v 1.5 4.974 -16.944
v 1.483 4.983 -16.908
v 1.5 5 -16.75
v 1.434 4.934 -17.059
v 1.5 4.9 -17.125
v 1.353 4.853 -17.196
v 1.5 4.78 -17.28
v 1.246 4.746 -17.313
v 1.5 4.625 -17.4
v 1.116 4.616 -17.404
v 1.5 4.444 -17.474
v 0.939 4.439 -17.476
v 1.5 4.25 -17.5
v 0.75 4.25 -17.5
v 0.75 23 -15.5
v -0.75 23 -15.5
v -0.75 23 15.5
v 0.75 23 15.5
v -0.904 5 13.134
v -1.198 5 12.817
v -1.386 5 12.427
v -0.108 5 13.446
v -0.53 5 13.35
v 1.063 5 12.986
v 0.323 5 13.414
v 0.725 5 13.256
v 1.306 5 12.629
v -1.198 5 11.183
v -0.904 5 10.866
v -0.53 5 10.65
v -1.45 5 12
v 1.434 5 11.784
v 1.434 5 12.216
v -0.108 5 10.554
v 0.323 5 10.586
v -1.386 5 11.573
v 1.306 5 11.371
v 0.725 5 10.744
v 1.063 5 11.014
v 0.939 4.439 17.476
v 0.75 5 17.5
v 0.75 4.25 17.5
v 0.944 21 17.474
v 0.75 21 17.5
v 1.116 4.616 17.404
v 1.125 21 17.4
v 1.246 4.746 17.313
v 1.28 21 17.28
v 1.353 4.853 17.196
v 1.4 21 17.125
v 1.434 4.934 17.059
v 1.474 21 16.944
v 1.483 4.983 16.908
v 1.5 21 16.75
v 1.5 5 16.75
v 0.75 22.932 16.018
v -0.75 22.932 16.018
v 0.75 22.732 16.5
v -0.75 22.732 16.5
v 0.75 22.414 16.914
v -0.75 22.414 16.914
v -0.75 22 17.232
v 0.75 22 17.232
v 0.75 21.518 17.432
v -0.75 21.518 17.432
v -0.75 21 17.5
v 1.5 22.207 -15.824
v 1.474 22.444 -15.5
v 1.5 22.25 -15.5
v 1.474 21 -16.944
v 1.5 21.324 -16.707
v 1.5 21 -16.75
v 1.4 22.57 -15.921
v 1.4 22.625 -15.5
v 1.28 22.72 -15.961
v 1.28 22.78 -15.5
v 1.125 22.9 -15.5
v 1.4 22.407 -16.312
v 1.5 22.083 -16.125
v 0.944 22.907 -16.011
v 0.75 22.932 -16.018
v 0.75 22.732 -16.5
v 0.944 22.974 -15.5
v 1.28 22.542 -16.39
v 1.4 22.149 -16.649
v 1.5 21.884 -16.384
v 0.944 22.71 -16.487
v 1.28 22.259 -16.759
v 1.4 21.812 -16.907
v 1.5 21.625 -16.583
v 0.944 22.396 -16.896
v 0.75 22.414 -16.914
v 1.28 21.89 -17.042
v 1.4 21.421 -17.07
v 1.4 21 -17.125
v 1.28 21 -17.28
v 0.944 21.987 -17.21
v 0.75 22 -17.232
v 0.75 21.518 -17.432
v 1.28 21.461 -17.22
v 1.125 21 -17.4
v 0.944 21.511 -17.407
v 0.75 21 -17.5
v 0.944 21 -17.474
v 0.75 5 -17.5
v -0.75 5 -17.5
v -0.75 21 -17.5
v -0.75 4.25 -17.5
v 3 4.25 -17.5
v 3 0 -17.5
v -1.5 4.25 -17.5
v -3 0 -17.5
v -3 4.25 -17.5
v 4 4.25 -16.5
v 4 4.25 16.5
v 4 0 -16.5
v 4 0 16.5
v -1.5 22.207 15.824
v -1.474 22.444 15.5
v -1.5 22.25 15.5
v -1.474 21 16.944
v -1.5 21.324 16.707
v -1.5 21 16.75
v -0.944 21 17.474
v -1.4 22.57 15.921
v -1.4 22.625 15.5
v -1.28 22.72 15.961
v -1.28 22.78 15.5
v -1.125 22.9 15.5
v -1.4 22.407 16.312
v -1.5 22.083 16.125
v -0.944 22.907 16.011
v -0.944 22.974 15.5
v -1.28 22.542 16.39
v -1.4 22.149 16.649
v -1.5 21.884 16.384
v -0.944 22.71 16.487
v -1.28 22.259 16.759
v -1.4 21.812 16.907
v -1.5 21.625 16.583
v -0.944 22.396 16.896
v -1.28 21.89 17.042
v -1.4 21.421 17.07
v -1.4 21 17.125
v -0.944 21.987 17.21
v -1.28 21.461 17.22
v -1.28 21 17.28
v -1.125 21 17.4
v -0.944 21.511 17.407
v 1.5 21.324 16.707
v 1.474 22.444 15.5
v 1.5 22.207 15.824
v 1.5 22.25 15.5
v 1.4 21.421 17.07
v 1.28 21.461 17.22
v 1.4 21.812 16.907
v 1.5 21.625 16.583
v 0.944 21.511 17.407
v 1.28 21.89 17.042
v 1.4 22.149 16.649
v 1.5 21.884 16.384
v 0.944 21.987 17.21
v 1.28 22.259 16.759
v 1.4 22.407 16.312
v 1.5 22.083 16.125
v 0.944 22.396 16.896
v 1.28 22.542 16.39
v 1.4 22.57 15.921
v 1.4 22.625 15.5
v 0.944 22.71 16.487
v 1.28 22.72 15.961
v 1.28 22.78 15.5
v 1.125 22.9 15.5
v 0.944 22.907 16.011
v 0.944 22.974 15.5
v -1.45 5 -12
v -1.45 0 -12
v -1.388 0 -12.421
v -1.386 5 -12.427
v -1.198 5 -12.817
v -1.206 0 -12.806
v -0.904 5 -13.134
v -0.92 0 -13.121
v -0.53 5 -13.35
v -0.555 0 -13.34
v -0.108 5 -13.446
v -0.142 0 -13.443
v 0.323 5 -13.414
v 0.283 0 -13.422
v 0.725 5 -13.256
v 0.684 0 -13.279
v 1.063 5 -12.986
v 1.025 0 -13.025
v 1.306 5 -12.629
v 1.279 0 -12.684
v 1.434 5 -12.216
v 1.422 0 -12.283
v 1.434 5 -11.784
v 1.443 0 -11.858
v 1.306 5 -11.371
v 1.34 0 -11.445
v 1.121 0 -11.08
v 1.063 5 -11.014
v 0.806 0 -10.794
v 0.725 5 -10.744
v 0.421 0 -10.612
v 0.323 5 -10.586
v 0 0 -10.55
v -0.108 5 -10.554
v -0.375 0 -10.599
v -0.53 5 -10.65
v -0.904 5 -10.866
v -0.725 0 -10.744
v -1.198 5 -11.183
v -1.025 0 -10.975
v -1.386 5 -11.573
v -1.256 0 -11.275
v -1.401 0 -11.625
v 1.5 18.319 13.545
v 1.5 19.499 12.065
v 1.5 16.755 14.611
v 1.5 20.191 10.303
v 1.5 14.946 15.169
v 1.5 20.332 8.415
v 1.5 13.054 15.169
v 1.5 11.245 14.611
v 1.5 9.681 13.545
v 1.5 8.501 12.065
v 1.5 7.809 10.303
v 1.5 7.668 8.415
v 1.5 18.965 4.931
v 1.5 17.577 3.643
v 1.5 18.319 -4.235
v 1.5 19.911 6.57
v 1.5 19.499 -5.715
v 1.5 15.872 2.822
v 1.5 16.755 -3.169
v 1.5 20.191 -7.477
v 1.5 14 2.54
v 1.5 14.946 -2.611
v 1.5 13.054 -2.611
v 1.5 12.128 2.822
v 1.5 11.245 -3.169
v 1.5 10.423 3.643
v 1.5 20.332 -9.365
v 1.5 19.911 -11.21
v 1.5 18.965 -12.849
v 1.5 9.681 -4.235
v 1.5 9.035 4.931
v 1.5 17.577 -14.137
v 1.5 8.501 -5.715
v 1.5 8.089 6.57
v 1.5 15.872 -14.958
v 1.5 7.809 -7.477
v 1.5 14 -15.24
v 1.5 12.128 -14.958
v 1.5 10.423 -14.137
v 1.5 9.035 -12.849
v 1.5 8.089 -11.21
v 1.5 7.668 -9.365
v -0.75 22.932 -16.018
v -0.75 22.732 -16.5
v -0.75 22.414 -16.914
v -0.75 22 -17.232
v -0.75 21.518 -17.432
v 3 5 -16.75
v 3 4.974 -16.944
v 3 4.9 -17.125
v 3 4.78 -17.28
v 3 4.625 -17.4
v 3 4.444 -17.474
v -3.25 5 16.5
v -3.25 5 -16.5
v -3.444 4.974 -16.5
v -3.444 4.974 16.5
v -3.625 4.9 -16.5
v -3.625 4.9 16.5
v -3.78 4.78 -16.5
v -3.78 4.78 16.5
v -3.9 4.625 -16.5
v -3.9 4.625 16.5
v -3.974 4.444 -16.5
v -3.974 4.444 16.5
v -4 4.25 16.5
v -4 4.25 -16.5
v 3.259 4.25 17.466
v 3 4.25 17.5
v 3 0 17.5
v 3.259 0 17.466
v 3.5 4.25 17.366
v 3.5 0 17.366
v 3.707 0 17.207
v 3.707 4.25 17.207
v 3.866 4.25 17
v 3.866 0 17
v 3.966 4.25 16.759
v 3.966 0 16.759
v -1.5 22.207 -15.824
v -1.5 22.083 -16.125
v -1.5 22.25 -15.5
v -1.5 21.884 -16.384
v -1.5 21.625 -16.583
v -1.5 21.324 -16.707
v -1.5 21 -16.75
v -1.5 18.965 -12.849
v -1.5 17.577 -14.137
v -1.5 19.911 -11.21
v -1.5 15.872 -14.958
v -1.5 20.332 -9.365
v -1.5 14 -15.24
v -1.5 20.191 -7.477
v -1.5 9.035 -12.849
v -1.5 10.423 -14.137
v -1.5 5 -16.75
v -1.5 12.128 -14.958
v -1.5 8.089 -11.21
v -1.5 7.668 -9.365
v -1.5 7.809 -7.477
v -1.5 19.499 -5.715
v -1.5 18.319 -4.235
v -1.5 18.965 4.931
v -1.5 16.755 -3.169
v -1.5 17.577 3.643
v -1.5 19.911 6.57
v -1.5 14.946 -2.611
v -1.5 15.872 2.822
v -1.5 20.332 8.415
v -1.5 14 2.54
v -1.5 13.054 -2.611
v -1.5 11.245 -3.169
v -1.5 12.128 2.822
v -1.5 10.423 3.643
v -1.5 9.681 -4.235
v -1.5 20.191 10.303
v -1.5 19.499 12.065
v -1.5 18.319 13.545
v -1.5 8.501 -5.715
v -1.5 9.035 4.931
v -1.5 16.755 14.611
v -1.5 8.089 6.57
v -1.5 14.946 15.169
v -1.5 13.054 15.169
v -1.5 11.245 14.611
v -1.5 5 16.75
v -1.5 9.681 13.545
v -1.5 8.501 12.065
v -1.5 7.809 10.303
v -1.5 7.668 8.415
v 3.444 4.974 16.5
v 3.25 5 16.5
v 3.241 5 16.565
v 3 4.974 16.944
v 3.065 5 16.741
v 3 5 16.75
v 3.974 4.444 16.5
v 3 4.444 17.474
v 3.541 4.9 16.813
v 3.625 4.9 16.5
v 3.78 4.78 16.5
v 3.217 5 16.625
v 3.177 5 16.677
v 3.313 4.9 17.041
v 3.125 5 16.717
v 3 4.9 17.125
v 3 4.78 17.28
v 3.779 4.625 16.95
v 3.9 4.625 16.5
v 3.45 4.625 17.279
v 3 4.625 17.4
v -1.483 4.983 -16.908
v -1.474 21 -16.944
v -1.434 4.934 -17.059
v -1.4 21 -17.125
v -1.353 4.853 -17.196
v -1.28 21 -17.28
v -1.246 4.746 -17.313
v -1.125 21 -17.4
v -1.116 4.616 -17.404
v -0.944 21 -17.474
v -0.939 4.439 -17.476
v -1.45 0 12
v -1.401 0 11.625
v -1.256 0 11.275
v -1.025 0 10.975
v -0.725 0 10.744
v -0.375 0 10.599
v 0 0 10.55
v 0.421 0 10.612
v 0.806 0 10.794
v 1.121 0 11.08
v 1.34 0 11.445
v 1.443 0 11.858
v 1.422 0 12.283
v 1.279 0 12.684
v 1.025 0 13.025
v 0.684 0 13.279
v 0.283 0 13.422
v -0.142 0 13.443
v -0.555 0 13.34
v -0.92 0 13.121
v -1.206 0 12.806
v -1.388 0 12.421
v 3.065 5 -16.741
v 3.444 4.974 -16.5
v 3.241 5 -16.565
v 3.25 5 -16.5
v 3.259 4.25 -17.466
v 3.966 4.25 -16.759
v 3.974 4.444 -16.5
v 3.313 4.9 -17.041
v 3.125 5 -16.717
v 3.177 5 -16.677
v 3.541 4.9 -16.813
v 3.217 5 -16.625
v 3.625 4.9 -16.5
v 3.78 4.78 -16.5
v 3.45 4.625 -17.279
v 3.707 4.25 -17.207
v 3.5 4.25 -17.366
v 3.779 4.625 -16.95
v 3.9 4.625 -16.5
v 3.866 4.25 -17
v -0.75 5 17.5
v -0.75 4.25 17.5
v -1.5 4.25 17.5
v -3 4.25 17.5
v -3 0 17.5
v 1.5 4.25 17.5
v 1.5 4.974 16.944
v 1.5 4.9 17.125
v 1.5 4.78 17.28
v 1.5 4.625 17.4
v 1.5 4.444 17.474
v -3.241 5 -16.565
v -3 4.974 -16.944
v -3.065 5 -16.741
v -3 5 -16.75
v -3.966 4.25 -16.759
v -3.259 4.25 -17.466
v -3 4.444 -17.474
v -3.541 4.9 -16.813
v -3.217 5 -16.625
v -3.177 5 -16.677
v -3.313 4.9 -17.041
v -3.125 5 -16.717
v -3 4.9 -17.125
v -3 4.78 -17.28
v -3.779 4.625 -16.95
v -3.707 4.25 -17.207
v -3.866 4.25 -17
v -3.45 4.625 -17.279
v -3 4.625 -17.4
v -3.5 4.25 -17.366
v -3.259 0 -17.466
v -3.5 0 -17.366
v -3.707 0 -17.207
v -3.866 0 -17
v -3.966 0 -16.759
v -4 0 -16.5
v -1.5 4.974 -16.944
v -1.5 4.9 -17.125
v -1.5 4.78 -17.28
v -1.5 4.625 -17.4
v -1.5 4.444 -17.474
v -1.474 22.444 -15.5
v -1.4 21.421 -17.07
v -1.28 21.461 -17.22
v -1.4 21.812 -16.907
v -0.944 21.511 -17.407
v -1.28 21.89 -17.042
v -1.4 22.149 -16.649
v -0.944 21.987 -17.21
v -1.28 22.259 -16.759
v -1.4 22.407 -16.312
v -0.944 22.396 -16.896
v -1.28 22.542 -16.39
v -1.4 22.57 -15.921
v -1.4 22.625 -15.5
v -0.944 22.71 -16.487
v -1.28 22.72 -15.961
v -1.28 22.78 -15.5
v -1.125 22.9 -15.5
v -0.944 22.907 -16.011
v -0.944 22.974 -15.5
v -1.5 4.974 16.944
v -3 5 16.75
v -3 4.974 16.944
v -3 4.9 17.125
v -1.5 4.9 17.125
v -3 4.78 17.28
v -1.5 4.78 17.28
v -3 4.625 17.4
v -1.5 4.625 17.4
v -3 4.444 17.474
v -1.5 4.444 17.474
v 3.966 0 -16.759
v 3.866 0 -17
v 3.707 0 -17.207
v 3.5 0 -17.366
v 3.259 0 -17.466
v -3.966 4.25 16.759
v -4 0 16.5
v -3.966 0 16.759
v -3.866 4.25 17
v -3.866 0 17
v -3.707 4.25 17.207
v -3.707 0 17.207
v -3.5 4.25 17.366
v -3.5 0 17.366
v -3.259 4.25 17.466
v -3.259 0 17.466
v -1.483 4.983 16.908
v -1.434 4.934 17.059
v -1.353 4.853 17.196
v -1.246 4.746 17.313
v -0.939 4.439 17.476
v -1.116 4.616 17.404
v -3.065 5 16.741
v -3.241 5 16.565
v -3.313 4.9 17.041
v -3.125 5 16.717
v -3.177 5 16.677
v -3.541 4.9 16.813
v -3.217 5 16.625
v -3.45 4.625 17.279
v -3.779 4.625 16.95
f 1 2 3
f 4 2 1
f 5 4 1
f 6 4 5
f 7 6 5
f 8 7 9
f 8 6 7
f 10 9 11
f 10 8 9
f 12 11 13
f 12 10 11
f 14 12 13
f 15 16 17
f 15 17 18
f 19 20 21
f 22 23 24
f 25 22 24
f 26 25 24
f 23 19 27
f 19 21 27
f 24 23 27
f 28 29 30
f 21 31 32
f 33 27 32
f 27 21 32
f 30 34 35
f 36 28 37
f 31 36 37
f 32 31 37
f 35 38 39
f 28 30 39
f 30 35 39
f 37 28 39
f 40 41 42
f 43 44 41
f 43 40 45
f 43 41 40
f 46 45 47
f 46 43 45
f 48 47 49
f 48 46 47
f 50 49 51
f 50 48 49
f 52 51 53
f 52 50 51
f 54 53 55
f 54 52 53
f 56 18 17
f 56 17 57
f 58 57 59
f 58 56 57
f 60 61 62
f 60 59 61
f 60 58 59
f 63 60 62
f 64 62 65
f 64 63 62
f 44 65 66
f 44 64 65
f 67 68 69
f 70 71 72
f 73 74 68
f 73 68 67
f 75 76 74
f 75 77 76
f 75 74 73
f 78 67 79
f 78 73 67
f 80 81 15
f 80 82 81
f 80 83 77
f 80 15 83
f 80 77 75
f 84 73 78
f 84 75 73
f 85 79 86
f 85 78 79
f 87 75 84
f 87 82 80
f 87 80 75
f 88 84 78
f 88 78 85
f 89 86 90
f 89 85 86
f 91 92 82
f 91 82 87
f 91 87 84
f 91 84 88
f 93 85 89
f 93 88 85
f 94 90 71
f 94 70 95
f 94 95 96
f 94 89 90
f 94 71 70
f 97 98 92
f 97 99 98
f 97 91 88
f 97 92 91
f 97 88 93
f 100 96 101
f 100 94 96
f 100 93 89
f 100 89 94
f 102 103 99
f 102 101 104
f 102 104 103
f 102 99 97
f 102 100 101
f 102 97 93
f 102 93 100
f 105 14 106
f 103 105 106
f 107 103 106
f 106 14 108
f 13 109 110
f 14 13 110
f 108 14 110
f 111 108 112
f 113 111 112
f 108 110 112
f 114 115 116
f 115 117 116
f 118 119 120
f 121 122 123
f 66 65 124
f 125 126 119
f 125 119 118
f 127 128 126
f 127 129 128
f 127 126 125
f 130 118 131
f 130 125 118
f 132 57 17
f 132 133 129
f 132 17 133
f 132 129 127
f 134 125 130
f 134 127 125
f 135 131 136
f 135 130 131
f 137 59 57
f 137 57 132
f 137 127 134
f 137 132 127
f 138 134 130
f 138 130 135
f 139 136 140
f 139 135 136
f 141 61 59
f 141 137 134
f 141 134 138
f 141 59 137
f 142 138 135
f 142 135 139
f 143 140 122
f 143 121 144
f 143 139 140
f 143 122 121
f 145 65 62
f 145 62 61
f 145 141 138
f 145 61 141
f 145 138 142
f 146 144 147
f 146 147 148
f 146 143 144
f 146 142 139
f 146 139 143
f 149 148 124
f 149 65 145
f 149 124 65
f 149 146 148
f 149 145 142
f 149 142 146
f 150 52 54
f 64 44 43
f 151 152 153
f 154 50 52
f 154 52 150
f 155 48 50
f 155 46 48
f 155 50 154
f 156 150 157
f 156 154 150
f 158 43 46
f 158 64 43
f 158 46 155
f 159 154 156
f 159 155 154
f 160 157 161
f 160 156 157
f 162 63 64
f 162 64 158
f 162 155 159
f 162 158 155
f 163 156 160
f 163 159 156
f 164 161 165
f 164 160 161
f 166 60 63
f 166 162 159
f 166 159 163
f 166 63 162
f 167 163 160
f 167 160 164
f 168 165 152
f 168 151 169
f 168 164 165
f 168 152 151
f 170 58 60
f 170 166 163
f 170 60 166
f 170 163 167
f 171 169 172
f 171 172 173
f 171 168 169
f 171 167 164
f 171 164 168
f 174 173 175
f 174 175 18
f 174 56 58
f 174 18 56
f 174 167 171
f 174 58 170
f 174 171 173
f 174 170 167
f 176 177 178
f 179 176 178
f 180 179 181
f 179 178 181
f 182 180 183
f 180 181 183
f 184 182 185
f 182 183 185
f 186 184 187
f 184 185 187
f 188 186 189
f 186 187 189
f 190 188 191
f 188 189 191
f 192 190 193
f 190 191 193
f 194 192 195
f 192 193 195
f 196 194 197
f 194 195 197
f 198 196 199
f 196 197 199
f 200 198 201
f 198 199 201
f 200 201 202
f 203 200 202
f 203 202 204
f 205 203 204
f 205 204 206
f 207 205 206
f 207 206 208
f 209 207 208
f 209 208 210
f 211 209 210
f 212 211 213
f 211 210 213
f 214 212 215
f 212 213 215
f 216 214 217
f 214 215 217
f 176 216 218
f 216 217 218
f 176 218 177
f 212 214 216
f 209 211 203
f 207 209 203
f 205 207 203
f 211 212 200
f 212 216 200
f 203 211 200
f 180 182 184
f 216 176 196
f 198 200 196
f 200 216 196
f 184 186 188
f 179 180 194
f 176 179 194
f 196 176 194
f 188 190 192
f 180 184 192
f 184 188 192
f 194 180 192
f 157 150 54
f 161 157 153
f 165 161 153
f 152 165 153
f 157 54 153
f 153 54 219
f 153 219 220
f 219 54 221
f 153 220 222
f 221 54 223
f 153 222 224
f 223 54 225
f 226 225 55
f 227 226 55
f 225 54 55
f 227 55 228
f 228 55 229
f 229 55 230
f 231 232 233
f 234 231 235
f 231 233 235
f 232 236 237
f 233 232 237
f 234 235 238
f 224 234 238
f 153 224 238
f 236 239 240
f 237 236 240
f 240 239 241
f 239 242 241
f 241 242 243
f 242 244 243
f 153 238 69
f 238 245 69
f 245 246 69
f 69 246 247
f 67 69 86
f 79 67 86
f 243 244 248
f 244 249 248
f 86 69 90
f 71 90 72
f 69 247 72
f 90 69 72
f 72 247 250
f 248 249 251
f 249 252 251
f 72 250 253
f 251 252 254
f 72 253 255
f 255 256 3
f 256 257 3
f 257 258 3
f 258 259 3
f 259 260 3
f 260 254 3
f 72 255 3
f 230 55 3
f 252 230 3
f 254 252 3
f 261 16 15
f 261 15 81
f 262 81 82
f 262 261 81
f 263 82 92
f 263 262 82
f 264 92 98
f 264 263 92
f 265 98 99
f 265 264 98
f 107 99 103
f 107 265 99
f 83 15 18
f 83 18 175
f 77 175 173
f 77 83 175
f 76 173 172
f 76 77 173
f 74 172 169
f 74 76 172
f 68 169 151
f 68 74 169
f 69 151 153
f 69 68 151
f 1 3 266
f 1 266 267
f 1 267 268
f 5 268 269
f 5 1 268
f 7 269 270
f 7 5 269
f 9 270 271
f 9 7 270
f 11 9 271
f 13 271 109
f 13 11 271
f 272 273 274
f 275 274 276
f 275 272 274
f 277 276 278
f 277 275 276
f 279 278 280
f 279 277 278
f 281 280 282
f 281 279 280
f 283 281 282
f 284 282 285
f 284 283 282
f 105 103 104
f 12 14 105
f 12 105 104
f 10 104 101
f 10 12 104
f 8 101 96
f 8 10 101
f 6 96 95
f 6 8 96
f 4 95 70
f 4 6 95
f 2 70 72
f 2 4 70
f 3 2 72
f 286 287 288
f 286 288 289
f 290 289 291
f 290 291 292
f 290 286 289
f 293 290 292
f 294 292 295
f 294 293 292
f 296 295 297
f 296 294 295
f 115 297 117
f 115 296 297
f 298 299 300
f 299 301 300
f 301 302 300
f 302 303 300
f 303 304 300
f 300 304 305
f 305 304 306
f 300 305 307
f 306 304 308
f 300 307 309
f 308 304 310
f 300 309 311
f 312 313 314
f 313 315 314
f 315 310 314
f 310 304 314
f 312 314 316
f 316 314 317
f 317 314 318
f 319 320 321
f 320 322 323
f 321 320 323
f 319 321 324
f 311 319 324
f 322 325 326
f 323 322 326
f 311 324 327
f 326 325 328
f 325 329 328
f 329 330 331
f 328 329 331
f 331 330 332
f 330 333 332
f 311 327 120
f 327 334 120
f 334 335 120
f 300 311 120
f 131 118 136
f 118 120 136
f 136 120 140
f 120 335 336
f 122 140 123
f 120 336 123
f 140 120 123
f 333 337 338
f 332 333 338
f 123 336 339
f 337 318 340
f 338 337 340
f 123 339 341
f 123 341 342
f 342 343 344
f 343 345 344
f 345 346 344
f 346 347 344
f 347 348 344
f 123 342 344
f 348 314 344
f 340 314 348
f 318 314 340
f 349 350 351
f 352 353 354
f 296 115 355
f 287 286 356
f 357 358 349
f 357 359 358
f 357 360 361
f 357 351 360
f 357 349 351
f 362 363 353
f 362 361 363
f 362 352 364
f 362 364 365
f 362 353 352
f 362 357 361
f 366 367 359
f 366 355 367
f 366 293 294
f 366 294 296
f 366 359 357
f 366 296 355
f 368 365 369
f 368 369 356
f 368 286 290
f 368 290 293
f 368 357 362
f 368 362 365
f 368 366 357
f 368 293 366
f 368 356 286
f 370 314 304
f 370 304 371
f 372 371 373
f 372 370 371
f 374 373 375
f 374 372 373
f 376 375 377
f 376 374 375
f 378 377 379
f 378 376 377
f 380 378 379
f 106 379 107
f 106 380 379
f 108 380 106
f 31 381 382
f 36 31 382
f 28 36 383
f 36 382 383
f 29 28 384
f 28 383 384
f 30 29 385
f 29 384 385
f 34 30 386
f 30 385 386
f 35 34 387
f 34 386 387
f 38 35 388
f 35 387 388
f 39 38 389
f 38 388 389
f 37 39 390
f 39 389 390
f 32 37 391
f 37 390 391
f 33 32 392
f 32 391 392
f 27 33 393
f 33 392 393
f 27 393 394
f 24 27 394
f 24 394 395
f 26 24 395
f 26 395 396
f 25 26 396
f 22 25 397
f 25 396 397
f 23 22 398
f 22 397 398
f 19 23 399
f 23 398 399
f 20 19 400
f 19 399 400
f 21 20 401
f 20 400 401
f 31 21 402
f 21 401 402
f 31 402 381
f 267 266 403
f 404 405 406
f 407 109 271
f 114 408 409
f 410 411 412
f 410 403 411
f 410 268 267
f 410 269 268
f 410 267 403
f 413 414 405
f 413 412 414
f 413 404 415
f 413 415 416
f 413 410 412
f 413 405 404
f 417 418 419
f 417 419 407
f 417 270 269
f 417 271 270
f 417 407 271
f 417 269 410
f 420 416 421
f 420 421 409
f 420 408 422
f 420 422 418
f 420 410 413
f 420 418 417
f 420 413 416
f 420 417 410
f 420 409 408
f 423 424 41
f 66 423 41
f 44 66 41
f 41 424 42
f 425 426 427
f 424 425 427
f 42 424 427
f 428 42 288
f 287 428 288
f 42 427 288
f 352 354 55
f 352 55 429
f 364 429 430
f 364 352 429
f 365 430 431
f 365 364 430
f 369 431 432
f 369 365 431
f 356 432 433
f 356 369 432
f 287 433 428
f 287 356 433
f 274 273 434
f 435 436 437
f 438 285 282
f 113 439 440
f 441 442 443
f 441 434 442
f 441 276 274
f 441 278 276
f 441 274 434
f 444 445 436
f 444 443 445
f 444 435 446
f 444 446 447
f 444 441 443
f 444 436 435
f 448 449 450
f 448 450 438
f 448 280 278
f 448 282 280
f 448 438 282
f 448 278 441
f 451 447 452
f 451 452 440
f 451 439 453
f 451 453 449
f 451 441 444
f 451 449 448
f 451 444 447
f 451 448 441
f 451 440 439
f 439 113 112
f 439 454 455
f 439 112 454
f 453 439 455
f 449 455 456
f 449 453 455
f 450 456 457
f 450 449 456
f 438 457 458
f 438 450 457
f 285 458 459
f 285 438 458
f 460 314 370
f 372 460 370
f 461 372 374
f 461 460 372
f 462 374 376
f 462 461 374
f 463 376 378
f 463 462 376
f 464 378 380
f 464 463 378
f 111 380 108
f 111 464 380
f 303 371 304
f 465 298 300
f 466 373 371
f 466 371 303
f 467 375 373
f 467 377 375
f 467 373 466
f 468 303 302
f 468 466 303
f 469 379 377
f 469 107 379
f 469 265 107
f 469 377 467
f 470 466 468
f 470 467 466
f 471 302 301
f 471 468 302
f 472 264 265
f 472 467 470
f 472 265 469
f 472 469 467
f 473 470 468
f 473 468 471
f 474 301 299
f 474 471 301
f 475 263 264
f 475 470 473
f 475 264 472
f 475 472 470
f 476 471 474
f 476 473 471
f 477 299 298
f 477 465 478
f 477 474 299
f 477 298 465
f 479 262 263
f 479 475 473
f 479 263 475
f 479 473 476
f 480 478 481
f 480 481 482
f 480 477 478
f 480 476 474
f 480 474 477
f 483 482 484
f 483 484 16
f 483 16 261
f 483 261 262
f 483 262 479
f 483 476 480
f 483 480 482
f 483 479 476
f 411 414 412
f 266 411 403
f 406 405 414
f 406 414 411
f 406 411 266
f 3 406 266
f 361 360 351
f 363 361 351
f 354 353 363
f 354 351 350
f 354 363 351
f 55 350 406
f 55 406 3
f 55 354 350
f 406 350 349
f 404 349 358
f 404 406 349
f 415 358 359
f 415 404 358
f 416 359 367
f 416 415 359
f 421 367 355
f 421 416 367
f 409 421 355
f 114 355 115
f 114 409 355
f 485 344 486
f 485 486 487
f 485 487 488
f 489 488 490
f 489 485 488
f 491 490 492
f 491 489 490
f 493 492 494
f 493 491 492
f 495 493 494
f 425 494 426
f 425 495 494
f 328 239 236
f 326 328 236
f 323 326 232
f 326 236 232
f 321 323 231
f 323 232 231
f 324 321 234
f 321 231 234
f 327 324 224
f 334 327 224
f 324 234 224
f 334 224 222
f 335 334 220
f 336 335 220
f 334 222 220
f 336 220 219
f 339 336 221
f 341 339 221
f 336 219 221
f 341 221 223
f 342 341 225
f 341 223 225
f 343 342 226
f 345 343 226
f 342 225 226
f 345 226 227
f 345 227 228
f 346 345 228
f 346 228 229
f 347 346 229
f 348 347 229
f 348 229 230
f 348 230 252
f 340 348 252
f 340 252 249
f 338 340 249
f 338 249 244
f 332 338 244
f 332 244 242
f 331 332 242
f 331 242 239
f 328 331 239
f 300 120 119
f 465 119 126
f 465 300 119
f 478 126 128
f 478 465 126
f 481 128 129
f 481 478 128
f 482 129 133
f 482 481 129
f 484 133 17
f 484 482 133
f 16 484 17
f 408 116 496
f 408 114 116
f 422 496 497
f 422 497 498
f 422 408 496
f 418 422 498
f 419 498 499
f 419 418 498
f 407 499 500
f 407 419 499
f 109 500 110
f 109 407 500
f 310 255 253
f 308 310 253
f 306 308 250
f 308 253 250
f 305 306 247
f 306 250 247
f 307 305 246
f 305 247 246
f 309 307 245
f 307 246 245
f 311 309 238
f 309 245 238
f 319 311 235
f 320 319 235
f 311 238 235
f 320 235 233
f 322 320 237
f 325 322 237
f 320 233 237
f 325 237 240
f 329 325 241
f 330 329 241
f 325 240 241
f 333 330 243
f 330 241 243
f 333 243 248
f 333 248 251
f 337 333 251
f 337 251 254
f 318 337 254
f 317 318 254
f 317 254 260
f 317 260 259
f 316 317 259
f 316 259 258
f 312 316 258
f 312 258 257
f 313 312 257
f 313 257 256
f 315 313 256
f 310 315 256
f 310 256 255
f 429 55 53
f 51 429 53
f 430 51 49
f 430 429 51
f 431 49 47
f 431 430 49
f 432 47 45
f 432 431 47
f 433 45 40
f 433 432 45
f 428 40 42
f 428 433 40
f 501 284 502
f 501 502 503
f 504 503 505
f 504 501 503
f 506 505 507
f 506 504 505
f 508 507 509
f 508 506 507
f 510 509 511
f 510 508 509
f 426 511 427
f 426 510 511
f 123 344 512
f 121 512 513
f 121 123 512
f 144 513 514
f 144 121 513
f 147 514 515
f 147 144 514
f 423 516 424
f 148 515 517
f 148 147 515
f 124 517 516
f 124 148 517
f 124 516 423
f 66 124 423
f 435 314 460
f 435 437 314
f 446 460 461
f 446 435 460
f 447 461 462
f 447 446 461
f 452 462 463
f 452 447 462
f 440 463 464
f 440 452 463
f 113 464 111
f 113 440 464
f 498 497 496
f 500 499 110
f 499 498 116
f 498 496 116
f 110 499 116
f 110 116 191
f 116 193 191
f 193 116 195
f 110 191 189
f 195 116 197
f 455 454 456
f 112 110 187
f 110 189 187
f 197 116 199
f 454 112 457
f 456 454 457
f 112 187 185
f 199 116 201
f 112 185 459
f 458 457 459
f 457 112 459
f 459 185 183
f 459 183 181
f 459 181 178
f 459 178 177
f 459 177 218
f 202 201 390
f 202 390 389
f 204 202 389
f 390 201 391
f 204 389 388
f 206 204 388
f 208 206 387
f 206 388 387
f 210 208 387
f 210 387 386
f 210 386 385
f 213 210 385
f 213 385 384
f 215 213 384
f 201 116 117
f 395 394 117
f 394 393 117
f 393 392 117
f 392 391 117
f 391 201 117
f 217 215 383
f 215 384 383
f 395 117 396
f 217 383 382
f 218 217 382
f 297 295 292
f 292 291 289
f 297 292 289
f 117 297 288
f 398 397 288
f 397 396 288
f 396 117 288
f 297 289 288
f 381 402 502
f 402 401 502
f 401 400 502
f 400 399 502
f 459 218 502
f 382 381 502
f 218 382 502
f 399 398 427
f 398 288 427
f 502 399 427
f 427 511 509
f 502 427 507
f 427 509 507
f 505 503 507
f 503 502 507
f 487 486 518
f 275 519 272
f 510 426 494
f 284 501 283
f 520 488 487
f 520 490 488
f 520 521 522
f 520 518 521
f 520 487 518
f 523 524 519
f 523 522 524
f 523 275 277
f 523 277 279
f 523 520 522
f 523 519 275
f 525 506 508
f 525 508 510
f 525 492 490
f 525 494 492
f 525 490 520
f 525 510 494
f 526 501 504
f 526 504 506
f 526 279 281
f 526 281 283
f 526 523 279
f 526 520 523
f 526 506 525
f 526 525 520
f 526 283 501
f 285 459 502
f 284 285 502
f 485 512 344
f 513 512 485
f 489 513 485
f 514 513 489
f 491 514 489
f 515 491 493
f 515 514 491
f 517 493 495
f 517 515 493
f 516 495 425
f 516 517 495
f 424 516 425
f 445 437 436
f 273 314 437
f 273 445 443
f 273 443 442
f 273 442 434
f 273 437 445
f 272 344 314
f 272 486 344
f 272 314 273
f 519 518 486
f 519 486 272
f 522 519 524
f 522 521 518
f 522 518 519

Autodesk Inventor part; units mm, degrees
ref_plane "YZ Plane" through (0, 0, 0) normal (1, 0, 0) x (0, 1, 0)
ref_plane "XZ Plane" through (0, 0, 0) normal (0, 1, 0) x (-1, 0, 0)
ref_plane "XY Plane" through (0, 0, 0) normal (0, 0, 1) x (1, 0, 0)
sketch "Sketch1" plane through (0, 0, 0) normal (0, 1, 0) x (-1, 0, 0)
  line L0 (-4, 17.5) -> (-4, -17.5)
  line L1 (-4, -17.5) -> (4, -17.5)
  line L2 (4, -17.5) -> (4, 17.5)
  line L3 (4, 17.5) -> (-4, 17.5)
  line L4 (-4, 17.5) -> (4, -17.5) construction
  line L5 (-4, -17.5) -> (4, 17.5) construction
  line L6 (0, 0) -> (0, 8.89)
  line L7 (0, 0) -> (0, 12)
  circle A0 centre (0, 12) radius 1.45
  line L8 (0, 0) -> (0, -12)
  circle A1 centre (0, -12) radius 1.45
  dimension "d0" = 35
  dimension "d1" = 8
  dimension "d3" = 12
  dimension "d4" = 2.9
  dimension "d5" = 12
  dimension "d6" = 2.9
extrude "Extrusion1" add sketch "Sketch1" along normal blind 5
sketch "Sketch2" plane through (0, 5, 0) normal (0, 1, 0) x (1, 0, 0)
  line L0 (1.5, -17.5) -> (1.5, 17.5)
  line L1 (1.5, 17.5) -> (-1.5, 17.5)
  line L2 (-1.5, 17.5) -> (-1.5, -17.5)
  line L3 (-1.5, -17.5) -> (1.5, -17.5)
  line L4 (1.5, -17.5) -> (-1.5, 17.5) construction
  line L5 (1.5, 17.5) -> (-1.5, -17.5) construction
  point P0 (0, 0)
  dimension "d9" = 35
  dimension "d10" = 3
extrude "Extrusion2" add sketch "Sketch2" along normal blind 18
sketch "Sketch3" plane through (1.5, 5, 17.5) normal (1, 0, 0) x (0, 0, -1)
  line L0 (0, 18) -> (35, 18) projected
  line L1 (17.5, 18) -> (17.5, 9)
  line L2 (17.5, 18) -> (26.5, 18) construction
  line L3 (17.5, 9) -> (8.61, 9)
  line L4 (17.5, 9) -> (26.39, 9)
  line L5 (17.5, 9) -> (26.39, 9) construction
  circle A0 centre (8.61, 9) radius 6.35
  circle A1 centre (26.39, 9) radius 6.35
  point P0 (17.5, -5)
  dimension "d13" = 9
  dimension "d14" = 90
  dimension "d15" = 8.89
  dimension "d16" = 90
  dimension "d17" = 8.89
  dimension "d18" = 0
  dimension "d19" = 12.7
  dimension "d20" = 12.7
extrude "Extrusion3" cut sketch "Sketch3" against normal blind 15
fillet "Fillet1" radius 2 2 edges at (0, 23, -17.5) (0, 23, 17.5)
fillet "Fillet2" radius 1 4 edges at (4, 2.5, -17.5) (-4, 2.5, -17.5) (4, 2.5, 17.5) (-4, 2.5, 17.5)
fillet "Fillet3" radius 0.75 10 edges at (1.5, 22.4142, -16.9142) (1.5, 13, -17.5) (1.5, 22.4142, 16.9142) (1.5, 13, 17.5) (1.5, 23, 0) (-1.5, 22.4142, 16.9142) (-1.5, 13, 17.5) (-1.5, 22.4142, -16.9142) (-1.5, 13, -17.5) (-1.5, 23, 0)
fillet "Fillet4" radius 0.75 10 edges at (3.7071, 5, -17.2071) (-2.25, 5, -17.5) (2.25, 5, -17.5) (-3.7071, 5, -17.2071) (-4, 5, 0) (-3.7071, 5, 17.2071) (-2.25, 5, 17.5) (2.25, 5, 17.5) (3.7071, 5, 17.2071) (4, 5, 0)
properties part number "Sonar Mount" material "ABS Plastic"
